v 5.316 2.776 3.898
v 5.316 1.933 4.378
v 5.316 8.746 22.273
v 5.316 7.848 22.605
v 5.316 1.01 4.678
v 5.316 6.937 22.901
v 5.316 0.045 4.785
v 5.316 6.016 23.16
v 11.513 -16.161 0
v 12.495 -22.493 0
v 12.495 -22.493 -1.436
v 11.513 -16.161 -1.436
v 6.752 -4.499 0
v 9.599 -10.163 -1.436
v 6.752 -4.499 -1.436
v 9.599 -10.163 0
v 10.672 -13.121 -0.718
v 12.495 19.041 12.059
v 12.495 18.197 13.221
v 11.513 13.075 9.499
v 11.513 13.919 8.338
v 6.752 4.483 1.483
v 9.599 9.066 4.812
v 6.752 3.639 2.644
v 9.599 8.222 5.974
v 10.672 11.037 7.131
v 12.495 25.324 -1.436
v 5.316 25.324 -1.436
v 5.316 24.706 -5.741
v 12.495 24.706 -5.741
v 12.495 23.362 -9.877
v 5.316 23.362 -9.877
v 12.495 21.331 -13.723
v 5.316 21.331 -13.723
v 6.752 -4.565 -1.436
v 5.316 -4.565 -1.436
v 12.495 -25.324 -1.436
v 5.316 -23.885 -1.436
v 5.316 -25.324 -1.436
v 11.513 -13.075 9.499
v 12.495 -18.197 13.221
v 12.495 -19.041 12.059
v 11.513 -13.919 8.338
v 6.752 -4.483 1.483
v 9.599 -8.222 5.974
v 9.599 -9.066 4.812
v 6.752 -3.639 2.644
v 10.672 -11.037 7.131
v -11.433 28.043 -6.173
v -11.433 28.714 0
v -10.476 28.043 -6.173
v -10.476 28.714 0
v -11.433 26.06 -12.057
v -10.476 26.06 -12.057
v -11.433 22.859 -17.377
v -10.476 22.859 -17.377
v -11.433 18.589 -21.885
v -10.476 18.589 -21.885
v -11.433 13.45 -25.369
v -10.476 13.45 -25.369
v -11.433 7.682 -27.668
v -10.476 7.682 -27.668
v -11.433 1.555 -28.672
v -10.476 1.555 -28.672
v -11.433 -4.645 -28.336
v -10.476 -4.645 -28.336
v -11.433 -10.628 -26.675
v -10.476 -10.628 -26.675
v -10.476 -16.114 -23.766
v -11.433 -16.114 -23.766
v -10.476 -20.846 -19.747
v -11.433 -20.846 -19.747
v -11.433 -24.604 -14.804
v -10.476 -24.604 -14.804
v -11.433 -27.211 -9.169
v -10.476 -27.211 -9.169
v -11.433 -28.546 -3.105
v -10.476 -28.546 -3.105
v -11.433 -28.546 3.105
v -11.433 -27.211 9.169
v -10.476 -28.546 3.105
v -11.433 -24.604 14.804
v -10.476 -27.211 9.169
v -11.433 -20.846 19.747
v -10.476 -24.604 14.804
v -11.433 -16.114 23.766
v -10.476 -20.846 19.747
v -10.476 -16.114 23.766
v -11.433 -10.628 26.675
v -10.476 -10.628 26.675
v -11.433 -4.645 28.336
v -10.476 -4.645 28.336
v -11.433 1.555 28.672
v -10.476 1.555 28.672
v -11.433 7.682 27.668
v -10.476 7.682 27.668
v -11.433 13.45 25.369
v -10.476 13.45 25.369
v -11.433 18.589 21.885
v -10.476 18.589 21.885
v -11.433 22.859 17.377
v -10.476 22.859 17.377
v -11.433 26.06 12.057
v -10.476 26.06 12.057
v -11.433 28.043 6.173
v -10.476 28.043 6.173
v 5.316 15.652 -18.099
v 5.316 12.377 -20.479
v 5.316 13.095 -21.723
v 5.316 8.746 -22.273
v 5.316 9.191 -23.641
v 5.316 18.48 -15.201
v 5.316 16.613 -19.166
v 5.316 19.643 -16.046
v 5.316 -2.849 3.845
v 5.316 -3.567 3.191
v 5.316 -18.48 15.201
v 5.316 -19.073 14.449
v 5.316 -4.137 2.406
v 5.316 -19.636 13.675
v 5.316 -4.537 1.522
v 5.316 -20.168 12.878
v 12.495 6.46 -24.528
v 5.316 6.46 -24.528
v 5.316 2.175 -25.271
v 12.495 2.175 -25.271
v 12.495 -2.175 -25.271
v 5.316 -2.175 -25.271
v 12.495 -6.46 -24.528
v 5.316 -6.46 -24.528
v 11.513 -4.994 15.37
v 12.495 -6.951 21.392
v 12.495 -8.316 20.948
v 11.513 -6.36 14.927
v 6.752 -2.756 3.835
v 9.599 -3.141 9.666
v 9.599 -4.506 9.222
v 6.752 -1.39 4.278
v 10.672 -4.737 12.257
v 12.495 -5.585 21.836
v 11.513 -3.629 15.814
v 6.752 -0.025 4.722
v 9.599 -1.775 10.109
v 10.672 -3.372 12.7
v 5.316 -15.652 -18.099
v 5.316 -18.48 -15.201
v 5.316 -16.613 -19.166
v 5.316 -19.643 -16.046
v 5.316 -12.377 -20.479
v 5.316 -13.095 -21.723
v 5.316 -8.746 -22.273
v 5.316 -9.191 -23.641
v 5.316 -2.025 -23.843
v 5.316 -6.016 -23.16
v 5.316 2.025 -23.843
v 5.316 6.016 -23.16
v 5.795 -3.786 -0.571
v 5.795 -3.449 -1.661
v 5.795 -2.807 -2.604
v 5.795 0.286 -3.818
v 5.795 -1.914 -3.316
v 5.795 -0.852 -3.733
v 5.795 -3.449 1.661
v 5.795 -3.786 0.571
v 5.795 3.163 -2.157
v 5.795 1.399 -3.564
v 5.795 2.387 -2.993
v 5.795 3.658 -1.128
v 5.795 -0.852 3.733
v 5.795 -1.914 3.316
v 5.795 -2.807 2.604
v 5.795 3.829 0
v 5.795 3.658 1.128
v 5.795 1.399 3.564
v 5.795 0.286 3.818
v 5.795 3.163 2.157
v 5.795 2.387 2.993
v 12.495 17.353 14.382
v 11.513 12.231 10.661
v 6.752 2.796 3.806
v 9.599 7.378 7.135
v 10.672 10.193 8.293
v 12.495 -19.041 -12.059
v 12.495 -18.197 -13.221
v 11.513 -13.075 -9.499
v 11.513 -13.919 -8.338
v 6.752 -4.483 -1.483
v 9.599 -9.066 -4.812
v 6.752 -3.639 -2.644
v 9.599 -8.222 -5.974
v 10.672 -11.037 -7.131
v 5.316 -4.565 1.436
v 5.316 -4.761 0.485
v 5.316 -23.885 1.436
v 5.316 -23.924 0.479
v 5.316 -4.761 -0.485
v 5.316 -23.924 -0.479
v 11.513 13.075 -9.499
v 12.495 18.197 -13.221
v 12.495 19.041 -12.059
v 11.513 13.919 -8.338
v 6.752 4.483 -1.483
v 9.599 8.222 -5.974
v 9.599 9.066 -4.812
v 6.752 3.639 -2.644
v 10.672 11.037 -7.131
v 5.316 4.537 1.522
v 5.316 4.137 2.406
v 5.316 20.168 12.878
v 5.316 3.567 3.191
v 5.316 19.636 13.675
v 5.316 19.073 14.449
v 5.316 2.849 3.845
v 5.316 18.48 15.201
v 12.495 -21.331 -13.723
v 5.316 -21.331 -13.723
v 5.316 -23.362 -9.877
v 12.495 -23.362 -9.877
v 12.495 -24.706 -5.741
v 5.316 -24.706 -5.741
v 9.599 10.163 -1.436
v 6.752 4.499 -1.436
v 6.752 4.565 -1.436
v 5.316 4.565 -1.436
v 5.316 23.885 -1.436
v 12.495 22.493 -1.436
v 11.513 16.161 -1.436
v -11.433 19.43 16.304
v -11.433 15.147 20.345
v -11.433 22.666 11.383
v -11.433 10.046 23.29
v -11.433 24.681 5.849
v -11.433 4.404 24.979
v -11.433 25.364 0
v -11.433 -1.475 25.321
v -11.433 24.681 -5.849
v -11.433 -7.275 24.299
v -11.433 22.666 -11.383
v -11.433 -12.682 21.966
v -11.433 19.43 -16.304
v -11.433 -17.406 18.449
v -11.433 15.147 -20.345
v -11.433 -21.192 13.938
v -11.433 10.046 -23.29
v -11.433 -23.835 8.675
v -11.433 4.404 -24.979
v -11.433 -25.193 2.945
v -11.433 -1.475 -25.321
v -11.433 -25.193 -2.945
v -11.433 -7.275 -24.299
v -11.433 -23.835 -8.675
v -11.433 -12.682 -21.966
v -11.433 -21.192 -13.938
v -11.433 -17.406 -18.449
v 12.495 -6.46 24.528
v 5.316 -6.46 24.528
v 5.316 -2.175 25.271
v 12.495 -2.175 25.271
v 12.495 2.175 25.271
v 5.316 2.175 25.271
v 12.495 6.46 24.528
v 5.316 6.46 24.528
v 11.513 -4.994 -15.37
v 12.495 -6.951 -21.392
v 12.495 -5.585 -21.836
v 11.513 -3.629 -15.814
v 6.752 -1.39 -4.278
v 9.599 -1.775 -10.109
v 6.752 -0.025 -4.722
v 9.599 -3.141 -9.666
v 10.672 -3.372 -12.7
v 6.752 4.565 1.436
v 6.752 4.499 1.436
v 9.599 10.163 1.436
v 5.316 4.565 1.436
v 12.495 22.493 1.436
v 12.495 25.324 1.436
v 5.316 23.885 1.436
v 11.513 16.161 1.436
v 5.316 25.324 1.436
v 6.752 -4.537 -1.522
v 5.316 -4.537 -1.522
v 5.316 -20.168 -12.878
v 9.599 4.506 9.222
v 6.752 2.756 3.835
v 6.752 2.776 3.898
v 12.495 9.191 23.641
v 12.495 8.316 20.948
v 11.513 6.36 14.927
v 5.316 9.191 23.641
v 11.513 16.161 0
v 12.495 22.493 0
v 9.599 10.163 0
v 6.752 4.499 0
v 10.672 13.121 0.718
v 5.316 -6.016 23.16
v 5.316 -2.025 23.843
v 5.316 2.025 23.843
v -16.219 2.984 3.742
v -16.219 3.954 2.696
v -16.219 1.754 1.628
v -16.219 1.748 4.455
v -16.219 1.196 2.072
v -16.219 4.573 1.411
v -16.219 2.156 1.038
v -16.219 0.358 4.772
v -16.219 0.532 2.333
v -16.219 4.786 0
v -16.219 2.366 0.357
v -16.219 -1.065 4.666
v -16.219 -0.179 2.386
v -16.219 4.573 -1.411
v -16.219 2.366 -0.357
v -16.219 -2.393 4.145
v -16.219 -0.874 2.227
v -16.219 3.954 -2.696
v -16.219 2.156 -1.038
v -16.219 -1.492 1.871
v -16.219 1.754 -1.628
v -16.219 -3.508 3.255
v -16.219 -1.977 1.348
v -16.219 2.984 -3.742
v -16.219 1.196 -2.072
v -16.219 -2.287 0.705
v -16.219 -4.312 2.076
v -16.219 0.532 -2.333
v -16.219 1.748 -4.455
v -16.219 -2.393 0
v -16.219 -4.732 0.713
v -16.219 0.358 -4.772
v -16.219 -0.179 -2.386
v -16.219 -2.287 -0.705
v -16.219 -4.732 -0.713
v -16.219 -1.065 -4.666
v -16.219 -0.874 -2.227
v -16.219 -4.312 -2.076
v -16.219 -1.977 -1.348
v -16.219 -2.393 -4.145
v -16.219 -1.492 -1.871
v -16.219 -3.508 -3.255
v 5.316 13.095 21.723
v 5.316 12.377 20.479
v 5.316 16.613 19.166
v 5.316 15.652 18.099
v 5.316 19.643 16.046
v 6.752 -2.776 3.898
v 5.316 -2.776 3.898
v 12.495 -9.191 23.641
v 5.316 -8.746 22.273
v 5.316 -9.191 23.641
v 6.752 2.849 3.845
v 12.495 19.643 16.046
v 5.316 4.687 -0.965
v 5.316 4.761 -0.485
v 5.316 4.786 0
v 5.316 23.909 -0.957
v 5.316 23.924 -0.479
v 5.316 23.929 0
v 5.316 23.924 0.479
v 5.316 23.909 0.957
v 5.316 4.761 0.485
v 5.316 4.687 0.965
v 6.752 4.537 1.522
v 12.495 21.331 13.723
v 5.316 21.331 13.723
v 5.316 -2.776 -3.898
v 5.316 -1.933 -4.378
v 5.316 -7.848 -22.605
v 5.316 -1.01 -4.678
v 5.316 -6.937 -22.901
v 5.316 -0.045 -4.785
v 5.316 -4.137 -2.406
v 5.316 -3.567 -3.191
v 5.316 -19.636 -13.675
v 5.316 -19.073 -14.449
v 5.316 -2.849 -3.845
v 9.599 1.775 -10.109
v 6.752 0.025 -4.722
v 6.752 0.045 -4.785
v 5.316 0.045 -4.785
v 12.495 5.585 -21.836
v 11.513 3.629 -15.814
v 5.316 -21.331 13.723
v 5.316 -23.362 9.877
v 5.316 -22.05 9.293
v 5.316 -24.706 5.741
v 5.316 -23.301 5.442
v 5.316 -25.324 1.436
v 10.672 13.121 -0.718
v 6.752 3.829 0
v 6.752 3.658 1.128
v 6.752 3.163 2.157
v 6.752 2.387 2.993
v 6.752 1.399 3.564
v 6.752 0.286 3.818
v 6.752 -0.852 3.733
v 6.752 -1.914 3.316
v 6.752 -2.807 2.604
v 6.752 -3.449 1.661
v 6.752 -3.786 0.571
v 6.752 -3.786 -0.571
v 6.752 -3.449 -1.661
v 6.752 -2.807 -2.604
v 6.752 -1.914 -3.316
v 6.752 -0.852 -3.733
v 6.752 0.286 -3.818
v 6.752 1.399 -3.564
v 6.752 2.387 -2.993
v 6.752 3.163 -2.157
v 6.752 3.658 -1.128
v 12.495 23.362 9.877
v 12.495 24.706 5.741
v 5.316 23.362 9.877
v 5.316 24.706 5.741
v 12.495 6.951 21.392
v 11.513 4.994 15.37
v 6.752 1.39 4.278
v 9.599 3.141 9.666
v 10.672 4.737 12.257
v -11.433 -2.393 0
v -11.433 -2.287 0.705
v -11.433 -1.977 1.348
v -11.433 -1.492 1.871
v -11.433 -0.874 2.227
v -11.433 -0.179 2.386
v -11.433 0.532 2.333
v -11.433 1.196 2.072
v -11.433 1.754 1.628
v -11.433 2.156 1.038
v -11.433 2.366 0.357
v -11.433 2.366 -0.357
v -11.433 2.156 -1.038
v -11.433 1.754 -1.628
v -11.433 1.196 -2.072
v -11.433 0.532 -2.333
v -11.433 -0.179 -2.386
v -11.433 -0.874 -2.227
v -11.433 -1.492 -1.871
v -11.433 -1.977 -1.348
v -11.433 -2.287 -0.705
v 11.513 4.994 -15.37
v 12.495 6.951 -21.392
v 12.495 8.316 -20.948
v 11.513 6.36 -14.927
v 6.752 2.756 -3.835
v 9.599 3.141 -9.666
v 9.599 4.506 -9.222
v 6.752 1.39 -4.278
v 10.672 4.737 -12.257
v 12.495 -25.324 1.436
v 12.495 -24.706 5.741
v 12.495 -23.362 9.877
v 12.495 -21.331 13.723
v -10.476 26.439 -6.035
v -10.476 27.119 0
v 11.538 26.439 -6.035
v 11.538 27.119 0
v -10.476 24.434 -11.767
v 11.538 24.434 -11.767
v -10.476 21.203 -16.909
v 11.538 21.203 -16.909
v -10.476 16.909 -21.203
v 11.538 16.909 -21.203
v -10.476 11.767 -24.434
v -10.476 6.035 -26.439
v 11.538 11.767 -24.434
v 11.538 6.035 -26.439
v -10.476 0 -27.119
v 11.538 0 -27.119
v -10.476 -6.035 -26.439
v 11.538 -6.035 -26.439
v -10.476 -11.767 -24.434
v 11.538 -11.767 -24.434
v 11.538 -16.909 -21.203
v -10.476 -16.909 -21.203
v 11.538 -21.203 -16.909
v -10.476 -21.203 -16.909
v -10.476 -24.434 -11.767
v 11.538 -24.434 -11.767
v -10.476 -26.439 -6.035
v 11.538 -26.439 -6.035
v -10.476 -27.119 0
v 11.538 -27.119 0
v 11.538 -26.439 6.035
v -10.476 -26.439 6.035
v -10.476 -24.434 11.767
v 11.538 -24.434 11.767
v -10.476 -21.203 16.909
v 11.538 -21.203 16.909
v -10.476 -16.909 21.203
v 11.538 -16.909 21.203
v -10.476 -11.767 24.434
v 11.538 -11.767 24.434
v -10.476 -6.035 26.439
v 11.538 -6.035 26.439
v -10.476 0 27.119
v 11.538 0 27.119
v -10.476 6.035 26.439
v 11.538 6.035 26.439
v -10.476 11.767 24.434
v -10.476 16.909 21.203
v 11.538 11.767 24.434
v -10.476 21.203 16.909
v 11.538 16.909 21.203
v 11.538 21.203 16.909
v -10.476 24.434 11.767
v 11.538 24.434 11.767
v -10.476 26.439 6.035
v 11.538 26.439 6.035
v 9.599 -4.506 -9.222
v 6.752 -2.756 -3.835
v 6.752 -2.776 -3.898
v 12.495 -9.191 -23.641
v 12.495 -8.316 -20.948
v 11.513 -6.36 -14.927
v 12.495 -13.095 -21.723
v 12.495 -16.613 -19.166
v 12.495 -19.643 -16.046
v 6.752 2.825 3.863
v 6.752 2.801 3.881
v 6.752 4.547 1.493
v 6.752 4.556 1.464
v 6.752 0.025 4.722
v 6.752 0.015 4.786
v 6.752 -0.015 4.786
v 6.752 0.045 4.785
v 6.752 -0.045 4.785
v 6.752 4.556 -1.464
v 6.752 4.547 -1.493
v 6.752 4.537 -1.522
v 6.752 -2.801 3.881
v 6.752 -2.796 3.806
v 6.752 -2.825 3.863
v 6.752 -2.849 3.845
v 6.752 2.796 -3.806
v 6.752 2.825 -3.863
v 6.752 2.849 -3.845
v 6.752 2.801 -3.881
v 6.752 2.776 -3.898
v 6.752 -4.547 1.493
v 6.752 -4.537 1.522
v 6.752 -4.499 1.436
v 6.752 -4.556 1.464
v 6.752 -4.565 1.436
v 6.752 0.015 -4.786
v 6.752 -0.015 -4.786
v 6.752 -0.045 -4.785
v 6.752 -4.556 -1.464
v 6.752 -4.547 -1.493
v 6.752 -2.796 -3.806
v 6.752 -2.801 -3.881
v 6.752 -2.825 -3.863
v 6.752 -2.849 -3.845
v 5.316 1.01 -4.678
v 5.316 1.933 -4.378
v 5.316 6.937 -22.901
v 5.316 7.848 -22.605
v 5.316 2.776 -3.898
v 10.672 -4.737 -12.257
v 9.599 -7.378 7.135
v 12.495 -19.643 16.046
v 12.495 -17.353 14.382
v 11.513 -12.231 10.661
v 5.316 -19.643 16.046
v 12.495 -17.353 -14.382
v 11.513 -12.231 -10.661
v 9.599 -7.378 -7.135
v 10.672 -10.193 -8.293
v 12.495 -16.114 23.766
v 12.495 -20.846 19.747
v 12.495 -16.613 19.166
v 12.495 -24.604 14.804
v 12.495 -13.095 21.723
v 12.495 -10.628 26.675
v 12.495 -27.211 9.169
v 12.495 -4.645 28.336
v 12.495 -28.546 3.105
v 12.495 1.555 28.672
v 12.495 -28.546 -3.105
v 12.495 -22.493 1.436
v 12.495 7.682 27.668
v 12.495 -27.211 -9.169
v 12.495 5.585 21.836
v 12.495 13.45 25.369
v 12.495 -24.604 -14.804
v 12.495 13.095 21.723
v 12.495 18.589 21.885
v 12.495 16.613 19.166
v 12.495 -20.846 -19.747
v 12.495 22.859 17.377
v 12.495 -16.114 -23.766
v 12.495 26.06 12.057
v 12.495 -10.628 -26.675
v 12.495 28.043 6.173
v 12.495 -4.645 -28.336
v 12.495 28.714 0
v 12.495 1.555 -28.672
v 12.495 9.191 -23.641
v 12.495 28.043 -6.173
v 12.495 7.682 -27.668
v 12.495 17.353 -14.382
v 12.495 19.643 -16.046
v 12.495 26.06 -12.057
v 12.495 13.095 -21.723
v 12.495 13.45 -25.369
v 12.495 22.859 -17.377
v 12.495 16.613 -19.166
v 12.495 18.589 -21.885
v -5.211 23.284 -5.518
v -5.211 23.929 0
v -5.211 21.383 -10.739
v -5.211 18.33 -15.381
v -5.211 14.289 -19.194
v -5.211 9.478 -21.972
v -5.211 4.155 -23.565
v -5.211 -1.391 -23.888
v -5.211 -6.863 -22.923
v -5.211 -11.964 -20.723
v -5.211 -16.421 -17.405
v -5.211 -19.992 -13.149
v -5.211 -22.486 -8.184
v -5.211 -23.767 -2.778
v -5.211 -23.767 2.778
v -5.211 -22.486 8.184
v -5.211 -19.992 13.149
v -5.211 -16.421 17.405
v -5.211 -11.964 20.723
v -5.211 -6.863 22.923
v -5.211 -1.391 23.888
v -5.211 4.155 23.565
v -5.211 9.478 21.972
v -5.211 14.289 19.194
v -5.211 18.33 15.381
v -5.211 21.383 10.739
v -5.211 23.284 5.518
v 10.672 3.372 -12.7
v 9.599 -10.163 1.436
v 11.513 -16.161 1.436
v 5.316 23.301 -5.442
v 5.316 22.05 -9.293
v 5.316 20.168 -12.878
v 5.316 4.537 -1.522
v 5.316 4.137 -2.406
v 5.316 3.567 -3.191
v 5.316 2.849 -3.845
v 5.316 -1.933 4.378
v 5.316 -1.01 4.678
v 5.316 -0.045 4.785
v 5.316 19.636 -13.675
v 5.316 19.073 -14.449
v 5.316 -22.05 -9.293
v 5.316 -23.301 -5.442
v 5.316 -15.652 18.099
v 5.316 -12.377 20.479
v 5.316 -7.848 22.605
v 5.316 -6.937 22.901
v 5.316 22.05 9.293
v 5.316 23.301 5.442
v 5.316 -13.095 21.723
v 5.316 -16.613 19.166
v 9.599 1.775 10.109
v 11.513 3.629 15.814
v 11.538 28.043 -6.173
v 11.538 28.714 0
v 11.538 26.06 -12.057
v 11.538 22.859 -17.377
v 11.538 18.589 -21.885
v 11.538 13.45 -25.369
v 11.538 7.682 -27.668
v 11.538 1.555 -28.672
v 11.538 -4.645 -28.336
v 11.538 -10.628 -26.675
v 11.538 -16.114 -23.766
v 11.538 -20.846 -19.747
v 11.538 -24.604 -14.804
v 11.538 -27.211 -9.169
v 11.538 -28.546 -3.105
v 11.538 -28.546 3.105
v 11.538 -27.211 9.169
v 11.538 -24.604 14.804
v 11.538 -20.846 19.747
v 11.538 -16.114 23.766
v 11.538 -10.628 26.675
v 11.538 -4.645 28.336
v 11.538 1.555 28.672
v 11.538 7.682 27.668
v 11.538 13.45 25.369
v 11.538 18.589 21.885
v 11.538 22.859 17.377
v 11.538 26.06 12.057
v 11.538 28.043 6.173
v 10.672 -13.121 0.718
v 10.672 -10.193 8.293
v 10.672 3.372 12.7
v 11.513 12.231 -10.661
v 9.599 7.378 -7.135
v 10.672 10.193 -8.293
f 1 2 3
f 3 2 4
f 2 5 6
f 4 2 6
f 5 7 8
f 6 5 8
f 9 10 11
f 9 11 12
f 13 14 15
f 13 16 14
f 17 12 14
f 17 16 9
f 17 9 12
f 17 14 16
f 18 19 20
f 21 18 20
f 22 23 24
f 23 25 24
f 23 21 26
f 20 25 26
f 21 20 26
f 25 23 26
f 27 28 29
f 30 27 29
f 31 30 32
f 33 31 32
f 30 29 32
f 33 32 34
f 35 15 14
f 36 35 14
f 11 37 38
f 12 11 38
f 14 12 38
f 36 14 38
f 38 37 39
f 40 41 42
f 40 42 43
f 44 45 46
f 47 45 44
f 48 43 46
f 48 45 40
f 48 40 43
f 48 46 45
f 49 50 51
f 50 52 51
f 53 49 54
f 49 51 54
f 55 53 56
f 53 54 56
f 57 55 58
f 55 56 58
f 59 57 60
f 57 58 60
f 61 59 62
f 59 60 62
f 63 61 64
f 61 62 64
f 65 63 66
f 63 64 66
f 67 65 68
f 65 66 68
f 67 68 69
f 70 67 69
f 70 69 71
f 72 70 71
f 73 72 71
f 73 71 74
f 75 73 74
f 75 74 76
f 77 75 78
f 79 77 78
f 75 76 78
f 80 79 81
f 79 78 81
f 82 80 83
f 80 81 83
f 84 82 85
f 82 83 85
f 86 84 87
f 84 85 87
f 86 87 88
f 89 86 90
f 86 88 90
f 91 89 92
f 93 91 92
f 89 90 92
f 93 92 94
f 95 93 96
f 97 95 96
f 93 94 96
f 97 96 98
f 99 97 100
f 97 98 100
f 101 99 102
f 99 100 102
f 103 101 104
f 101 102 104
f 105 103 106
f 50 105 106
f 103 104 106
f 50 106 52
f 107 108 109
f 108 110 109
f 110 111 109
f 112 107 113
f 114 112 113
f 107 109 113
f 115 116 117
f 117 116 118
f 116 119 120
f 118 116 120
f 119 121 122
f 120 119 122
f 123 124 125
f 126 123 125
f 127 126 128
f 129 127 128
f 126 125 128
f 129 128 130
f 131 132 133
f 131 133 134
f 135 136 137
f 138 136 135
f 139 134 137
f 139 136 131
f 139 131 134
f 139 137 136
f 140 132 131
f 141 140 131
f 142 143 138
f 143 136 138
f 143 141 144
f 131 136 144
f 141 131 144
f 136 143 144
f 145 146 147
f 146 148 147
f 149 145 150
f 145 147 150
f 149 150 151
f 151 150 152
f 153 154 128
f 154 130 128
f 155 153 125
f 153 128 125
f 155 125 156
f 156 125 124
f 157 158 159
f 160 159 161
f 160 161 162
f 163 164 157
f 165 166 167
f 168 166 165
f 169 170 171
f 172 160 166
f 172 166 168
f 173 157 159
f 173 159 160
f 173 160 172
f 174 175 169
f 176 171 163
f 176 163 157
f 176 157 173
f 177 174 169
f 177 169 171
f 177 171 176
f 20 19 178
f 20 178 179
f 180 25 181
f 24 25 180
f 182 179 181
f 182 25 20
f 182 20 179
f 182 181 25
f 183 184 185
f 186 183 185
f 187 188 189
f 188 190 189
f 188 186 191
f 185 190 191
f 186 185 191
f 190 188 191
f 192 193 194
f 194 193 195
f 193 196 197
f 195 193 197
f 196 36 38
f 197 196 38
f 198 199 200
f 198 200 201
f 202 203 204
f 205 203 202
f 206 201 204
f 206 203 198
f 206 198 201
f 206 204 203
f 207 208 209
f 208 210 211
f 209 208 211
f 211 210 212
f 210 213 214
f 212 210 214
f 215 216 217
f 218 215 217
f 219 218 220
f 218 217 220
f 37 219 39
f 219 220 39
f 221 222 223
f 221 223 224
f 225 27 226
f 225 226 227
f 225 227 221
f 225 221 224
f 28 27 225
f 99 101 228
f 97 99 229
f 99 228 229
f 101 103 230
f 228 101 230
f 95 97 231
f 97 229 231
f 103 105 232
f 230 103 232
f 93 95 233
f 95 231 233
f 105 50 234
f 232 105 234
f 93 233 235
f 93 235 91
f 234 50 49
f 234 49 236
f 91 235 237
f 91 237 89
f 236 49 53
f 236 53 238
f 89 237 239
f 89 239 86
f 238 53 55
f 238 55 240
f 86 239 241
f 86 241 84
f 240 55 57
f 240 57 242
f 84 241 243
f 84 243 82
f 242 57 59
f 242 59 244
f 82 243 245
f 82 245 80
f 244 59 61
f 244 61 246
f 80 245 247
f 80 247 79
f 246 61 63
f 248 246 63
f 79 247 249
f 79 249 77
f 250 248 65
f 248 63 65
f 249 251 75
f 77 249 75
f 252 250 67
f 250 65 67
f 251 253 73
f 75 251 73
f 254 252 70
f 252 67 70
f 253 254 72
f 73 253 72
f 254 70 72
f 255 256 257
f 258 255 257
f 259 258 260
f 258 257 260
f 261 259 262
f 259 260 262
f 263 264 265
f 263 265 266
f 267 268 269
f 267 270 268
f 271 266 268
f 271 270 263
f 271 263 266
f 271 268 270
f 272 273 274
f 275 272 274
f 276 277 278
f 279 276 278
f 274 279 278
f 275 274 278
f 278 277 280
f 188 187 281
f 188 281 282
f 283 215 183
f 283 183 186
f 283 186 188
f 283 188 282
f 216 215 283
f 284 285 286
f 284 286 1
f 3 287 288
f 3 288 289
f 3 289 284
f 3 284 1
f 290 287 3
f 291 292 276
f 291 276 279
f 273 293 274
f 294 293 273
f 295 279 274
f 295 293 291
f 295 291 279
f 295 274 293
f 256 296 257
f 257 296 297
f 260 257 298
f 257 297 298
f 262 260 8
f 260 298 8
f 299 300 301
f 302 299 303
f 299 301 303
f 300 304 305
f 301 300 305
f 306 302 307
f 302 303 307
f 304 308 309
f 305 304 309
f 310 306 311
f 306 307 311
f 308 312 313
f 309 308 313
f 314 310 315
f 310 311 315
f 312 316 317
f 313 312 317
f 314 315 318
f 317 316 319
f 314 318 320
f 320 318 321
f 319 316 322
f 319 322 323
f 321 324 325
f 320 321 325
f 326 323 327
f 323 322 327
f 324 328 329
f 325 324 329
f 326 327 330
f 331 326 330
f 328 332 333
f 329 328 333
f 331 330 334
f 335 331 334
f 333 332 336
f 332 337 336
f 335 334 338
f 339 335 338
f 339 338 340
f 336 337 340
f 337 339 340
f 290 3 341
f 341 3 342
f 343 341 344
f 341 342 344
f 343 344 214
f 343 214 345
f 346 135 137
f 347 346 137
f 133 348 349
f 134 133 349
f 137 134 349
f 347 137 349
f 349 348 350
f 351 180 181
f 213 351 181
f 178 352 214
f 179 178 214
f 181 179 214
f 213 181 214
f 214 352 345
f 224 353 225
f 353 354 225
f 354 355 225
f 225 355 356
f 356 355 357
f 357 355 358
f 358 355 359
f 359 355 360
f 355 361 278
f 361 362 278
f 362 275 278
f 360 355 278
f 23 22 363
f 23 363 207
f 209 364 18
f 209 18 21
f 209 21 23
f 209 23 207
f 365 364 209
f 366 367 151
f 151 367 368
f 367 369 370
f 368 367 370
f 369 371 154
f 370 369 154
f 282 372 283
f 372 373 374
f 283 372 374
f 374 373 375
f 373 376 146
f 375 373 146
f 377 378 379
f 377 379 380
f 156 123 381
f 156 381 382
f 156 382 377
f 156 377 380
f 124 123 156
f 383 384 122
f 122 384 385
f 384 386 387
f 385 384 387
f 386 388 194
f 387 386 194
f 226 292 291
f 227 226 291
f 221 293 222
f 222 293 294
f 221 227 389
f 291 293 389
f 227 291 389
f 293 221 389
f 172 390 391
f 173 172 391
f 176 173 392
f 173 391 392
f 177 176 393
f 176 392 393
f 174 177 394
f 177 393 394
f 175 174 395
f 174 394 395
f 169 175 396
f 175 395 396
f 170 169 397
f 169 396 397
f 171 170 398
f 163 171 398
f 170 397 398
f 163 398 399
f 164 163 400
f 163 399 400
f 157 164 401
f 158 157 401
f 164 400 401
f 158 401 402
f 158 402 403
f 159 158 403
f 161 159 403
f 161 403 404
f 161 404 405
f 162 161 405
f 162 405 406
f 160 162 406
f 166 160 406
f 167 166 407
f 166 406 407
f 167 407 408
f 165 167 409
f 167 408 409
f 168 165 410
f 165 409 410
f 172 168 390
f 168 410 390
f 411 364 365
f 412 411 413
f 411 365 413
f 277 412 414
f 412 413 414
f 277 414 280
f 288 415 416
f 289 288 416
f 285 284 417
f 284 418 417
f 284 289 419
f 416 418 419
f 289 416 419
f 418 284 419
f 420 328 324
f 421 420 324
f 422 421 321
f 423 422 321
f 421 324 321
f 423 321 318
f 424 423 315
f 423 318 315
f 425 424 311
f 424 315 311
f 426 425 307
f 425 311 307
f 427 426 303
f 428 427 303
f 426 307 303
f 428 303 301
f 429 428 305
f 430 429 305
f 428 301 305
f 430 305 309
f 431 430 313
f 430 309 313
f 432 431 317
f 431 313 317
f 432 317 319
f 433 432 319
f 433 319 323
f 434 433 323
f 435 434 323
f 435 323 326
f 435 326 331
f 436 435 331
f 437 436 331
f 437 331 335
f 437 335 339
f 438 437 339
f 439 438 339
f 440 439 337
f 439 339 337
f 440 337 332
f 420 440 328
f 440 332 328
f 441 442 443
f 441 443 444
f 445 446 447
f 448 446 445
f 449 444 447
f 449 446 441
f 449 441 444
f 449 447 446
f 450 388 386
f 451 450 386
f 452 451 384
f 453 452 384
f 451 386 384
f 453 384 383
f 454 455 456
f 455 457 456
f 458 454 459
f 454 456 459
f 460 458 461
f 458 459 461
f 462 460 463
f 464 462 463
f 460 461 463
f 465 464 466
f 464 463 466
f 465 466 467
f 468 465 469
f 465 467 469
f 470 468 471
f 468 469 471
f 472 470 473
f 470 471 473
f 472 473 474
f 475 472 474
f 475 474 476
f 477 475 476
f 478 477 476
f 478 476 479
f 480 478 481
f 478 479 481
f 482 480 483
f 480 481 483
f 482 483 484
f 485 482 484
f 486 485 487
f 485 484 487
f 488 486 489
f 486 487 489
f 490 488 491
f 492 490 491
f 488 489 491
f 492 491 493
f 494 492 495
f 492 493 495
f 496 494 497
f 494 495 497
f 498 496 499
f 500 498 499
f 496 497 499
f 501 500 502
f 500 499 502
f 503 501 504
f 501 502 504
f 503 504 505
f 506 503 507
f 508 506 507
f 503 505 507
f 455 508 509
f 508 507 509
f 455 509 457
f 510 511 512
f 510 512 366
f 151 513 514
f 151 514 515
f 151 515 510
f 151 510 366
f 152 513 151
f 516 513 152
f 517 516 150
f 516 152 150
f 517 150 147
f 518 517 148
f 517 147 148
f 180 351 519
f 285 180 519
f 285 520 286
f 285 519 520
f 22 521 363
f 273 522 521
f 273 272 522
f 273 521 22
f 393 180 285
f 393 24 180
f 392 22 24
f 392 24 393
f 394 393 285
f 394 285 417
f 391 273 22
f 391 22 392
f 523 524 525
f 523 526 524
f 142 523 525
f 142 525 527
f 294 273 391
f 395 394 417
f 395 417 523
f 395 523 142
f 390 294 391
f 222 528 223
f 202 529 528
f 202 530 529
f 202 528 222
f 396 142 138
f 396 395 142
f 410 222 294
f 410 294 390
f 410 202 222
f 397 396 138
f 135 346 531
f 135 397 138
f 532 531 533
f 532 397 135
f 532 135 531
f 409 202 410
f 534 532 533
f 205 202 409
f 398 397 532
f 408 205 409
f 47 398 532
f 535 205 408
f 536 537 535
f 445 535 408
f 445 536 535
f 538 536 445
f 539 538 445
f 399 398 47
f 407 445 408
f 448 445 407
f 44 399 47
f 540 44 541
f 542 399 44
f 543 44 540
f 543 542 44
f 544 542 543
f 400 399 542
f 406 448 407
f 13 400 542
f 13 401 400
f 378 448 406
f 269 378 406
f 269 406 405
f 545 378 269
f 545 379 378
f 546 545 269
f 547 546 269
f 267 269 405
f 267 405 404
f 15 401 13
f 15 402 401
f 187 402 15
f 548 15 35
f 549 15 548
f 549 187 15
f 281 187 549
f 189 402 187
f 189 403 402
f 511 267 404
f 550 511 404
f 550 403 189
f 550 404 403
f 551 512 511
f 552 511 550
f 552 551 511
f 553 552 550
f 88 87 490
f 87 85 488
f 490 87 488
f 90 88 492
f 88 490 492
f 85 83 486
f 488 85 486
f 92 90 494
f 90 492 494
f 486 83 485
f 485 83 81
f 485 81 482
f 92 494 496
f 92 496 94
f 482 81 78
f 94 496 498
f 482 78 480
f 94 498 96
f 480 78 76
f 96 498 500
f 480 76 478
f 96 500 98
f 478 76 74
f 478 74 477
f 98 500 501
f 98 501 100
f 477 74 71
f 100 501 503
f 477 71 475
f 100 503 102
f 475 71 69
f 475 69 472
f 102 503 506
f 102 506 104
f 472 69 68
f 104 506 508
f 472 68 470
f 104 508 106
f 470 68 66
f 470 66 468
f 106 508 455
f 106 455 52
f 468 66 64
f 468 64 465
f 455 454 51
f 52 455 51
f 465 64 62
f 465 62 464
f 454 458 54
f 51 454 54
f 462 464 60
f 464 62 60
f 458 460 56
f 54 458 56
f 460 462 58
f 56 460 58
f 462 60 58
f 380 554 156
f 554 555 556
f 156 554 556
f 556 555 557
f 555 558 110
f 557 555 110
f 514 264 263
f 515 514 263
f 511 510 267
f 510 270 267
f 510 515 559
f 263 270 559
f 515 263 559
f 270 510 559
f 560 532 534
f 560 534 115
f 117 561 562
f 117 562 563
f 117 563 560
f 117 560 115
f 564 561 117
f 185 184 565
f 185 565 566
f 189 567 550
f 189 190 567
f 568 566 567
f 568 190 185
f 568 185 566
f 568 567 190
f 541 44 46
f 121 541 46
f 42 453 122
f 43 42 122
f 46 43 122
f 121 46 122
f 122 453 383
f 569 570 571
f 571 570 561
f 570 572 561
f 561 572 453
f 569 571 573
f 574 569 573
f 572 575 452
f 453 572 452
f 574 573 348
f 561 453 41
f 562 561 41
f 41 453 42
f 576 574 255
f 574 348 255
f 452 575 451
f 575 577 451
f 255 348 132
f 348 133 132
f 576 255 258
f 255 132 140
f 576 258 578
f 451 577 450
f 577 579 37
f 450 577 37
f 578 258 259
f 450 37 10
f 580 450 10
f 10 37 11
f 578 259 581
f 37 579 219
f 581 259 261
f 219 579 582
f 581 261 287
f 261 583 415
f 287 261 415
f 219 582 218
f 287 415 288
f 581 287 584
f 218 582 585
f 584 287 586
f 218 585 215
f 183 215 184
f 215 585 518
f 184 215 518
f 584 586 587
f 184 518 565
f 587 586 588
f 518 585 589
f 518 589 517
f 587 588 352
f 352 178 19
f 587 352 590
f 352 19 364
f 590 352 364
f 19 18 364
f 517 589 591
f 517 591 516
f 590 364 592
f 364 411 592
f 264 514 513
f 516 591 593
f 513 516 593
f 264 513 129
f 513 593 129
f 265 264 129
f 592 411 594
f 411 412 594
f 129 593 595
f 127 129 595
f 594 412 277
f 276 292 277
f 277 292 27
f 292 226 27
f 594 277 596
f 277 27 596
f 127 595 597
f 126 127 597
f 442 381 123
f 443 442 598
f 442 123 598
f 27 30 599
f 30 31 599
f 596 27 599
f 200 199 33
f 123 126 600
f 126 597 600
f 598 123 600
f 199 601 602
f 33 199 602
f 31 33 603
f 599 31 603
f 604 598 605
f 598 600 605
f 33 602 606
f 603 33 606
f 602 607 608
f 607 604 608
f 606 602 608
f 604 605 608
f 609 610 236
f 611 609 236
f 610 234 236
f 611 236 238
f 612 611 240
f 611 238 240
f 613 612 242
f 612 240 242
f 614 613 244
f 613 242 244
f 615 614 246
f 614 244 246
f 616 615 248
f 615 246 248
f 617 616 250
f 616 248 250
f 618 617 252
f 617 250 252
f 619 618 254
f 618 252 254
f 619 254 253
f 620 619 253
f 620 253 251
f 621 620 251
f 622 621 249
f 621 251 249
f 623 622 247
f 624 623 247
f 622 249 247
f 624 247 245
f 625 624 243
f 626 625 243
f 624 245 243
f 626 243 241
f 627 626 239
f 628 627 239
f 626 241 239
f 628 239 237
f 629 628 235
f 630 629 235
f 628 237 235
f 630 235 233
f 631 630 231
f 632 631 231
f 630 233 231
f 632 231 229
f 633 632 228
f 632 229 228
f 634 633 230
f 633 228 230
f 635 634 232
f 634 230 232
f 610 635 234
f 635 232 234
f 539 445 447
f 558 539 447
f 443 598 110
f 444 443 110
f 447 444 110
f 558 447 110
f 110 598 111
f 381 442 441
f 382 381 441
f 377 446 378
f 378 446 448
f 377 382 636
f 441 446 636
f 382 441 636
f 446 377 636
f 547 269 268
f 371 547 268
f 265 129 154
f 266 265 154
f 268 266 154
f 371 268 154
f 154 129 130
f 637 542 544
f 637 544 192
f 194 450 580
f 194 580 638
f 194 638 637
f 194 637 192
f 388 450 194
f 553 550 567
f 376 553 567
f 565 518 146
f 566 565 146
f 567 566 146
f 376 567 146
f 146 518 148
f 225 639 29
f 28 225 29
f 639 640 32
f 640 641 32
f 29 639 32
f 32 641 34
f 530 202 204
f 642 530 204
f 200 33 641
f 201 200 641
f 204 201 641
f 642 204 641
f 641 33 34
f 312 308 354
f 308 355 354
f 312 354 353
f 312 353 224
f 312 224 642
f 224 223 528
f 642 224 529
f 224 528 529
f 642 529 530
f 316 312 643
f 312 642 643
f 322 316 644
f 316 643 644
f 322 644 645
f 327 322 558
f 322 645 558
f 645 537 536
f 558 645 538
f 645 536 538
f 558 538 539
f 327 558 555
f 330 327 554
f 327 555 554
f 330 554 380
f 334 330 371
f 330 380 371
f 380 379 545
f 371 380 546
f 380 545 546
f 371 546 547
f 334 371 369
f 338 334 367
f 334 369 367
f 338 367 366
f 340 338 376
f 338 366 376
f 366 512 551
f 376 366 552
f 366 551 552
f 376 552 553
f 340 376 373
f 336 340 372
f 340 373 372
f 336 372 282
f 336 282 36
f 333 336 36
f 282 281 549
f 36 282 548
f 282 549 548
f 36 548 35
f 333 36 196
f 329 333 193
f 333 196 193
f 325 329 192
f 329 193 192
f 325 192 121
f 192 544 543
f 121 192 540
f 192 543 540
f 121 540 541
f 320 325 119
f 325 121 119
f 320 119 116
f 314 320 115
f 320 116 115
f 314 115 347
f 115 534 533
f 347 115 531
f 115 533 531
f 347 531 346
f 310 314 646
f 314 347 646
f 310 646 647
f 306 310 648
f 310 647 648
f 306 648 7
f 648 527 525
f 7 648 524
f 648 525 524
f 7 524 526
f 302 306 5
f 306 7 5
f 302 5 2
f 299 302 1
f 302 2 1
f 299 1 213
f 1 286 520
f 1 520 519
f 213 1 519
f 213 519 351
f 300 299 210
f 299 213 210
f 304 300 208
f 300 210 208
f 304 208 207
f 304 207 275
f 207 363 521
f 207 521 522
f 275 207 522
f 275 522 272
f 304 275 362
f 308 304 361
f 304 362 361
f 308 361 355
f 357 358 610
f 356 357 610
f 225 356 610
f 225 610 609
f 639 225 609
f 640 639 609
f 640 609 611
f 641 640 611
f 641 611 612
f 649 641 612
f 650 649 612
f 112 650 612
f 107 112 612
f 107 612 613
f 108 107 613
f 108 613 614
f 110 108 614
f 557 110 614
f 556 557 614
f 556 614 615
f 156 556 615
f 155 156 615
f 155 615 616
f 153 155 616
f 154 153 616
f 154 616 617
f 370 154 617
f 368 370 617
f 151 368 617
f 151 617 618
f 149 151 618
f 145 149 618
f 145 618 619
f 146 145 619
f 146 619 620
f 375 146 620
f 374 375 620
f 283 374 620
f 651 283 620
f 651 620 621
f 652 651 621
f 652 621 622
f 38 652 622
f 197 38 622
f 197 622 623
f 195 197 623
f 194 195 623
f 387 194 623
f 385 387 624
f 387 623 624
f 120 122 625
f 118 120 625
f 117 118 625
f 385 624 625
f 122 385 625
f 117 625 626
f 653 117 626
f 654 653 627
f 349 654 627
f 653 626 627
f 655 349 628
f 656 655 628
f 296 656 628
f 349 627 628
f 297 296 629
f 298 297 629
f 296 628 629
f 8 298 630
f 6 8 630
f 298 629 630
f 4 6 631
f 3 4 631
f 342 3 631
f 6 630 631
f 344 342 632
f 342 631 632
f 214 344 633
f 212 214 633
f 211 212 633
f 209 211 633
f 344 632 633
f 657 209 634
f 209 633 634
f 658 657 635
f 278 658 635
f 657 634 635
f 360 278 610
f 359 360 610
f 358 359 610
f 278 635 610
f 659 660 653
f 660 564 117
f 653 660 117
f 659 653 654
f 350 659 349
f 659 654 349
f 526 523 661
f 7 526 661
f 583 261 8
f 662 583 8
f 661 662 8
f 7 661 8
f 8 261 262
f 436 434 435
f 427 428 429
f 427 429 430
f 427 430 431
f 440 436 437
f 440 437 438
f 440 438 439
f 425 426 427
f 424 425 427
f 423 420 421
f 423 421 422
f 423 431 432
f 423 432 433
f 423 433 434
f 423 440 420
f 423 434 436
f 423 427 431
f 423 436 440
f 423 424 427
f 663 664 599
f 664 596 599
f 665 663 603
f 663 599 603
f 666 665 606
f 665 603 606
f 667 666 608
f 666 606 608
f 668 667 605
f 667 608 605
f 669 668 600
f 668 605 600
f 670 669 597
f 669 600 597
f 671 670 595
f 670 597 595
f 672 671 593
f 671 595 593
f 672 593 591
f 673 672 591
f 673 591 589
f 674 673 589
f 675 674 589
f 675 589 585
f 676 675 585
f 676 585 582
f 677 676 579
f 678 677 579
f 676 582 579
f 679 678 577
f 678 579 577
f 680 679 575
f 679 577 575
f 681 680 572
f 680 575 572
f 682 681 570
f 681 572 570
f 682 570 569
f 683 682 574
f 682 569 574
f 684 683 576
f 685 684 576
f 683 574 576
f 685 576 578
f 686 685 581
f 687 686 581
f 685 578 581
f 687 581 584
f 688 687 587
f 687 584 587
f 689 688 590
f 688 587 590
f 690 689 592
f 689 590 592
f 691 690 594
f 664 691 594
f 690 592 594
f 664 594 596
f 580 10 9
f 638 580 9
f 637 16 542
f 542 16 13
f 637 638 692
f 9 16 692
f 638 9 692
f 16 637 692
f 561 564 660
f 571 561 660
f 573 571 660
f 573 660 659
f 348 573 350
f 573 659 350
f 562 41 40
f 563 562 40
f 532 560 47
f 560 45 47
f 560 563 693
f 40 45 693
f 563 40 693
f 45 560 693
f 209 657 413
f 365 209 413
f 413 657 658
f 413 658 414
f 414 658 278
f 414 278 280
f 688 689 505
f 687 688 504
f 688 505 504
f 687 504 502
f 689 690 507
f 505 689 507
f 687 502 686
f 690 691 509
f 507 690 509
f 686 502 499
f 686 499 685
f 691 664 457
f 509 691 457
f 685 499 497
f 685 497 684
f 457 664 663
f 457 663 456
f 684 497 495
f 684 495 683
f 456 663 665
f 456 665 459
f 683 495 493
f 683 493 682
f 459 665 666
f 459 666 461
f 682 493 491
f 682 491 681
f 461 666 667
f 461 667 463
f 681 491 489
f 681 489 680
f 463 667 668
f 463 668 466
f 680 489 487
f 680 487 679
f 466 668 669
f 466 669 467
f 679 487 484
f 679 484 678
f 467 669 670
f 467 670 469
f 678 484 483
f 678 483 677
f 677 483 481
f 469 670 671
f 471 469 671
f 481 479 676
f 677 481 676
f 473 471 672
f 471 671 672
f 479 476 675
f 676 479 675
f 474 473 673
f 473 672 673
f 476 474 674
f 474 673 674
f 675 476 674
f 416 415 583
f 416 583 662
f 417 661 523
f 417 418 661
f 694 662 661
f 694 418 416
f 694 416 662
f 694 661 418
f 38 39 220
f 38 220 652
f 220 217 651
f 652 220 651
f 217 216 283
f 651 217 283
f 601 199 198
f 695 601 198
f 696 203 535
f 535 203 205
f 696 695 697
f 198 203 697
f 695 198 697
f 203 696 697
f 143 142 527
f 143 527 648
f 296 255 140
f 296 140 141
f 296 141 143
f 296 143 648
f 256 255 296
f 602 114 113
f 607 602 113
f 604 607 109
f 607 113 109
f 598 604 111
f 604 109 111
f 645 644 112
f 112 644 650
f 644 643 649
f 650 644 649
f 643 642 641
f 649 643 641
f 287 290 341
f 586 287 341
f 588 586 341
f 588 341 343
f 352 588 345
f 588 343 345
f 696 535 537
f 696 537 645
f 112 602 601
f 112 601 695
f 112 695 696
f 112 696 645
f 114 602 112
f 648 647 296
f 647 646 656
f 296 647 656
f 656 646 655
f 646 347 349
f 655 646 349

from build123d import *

# Parameters (mm, degrees)
CROQUIS1_W              = 24
CROQUIS1_H              = 5
SALIENTE_EXTRUIR1_DEPTH = 1.5
MATRIZC1_COUNT          = 10
CROQUIS3_R              = 4
CORTAR_EXTRUIR1_DEPTH   = 1
CROQUIS4_R              = 2.5
CORTAR_EXTRUIR2_DEPTH   = 5
SCALE1_SCALE            = 0.957142857


with BuildPart() as part:
    # Croquis1 → Revolución1 (revolve)
    with BuildSketch(Plane.XY):
        Polygon((-12, 26.5), (-12, 30), (-11, 30), (-11, 28.33342991), (12, 28.33342991), (12, 30), (13, 30), (13, 26.5), (5.499345391, 26.5), (5.499345391, 25), (-5.499345391, 25), align=None)
        with Locations((-5, 2.5)):
            Rectangle(CROQUIS1_W, CROQUIS1_H)
    revolve(axis=Axis((-17, 0, 0), (-1, 0, 0)))

    # Croquis2 → Saliente-Extruir1 (add, symmetric)
    with BuildSketch(Plane.XY):
        with BuildLine():
            Line((13, 26.5), (13, 23.5))
            add(Edge.make_bspline(
                [(13, 23.5), (12.190614948, 13.316000856), (7, 4.7)],
                knots=[0, 0, 0, 1, 1, 1], degree=2))
            Line((7, 4.7), (5.499345391, 4.7))
            Line((5.499345391, 4.7), (5.499345391, 26.5))
            Line((5.499345391, 26.5), (13, 26.5))
        make_face()
    saliente_extruir1 = extrude(amount=SALIENTE_EXTRUIR1_DEPTH, both=True)

    # MatrizC1: Saliente-Extruir1 ×10 about axis
    matrizc1_axis = Axis((5.499345391, 0, 0), (1, 0, 0))
    for i in range(1, MATRIZC1_COUNT):
        add(saliente_extruir1.rotate(matrizc1_axis, i * 360 / MATRIZC1_COUNT))

    # Croquis3 → Cortar-Extruir1 (cut)
    with BuildSketch(Plane(origin=(7, 0, 0), x_dir=(0, 0, -1), z_dir=(1, 0, 0))):
        with Locations(Location((0, 0, 0), (0, 0, 90))):
            Circle(CROQUIS3_R)
    extrude(amount=-CORTAR_EXTRUIR1_DEPTH, mode=Mode.SUBTRACT)

    # Croquis4 → Cortar-Extruir2 (cut)
    with BuildSketch(Plane.ZY.offset(17)):
        with Locations(Location((0, 0, 0), (0, 0, 270))):
            Circle(CROQUIS4_R)
    extrude(amount=-CORTAR_EXTRUIR2_DEPTH, mode=Mode.SUBTRACT)


with BuildPart() as part_1:
    # Scale1: scaled about (1.224671263, 0, 0)
    add(part.part.scale(SCALE1_SCALE).moved(Location((0.052485911, 0, 0))))


solid = part_1.part
